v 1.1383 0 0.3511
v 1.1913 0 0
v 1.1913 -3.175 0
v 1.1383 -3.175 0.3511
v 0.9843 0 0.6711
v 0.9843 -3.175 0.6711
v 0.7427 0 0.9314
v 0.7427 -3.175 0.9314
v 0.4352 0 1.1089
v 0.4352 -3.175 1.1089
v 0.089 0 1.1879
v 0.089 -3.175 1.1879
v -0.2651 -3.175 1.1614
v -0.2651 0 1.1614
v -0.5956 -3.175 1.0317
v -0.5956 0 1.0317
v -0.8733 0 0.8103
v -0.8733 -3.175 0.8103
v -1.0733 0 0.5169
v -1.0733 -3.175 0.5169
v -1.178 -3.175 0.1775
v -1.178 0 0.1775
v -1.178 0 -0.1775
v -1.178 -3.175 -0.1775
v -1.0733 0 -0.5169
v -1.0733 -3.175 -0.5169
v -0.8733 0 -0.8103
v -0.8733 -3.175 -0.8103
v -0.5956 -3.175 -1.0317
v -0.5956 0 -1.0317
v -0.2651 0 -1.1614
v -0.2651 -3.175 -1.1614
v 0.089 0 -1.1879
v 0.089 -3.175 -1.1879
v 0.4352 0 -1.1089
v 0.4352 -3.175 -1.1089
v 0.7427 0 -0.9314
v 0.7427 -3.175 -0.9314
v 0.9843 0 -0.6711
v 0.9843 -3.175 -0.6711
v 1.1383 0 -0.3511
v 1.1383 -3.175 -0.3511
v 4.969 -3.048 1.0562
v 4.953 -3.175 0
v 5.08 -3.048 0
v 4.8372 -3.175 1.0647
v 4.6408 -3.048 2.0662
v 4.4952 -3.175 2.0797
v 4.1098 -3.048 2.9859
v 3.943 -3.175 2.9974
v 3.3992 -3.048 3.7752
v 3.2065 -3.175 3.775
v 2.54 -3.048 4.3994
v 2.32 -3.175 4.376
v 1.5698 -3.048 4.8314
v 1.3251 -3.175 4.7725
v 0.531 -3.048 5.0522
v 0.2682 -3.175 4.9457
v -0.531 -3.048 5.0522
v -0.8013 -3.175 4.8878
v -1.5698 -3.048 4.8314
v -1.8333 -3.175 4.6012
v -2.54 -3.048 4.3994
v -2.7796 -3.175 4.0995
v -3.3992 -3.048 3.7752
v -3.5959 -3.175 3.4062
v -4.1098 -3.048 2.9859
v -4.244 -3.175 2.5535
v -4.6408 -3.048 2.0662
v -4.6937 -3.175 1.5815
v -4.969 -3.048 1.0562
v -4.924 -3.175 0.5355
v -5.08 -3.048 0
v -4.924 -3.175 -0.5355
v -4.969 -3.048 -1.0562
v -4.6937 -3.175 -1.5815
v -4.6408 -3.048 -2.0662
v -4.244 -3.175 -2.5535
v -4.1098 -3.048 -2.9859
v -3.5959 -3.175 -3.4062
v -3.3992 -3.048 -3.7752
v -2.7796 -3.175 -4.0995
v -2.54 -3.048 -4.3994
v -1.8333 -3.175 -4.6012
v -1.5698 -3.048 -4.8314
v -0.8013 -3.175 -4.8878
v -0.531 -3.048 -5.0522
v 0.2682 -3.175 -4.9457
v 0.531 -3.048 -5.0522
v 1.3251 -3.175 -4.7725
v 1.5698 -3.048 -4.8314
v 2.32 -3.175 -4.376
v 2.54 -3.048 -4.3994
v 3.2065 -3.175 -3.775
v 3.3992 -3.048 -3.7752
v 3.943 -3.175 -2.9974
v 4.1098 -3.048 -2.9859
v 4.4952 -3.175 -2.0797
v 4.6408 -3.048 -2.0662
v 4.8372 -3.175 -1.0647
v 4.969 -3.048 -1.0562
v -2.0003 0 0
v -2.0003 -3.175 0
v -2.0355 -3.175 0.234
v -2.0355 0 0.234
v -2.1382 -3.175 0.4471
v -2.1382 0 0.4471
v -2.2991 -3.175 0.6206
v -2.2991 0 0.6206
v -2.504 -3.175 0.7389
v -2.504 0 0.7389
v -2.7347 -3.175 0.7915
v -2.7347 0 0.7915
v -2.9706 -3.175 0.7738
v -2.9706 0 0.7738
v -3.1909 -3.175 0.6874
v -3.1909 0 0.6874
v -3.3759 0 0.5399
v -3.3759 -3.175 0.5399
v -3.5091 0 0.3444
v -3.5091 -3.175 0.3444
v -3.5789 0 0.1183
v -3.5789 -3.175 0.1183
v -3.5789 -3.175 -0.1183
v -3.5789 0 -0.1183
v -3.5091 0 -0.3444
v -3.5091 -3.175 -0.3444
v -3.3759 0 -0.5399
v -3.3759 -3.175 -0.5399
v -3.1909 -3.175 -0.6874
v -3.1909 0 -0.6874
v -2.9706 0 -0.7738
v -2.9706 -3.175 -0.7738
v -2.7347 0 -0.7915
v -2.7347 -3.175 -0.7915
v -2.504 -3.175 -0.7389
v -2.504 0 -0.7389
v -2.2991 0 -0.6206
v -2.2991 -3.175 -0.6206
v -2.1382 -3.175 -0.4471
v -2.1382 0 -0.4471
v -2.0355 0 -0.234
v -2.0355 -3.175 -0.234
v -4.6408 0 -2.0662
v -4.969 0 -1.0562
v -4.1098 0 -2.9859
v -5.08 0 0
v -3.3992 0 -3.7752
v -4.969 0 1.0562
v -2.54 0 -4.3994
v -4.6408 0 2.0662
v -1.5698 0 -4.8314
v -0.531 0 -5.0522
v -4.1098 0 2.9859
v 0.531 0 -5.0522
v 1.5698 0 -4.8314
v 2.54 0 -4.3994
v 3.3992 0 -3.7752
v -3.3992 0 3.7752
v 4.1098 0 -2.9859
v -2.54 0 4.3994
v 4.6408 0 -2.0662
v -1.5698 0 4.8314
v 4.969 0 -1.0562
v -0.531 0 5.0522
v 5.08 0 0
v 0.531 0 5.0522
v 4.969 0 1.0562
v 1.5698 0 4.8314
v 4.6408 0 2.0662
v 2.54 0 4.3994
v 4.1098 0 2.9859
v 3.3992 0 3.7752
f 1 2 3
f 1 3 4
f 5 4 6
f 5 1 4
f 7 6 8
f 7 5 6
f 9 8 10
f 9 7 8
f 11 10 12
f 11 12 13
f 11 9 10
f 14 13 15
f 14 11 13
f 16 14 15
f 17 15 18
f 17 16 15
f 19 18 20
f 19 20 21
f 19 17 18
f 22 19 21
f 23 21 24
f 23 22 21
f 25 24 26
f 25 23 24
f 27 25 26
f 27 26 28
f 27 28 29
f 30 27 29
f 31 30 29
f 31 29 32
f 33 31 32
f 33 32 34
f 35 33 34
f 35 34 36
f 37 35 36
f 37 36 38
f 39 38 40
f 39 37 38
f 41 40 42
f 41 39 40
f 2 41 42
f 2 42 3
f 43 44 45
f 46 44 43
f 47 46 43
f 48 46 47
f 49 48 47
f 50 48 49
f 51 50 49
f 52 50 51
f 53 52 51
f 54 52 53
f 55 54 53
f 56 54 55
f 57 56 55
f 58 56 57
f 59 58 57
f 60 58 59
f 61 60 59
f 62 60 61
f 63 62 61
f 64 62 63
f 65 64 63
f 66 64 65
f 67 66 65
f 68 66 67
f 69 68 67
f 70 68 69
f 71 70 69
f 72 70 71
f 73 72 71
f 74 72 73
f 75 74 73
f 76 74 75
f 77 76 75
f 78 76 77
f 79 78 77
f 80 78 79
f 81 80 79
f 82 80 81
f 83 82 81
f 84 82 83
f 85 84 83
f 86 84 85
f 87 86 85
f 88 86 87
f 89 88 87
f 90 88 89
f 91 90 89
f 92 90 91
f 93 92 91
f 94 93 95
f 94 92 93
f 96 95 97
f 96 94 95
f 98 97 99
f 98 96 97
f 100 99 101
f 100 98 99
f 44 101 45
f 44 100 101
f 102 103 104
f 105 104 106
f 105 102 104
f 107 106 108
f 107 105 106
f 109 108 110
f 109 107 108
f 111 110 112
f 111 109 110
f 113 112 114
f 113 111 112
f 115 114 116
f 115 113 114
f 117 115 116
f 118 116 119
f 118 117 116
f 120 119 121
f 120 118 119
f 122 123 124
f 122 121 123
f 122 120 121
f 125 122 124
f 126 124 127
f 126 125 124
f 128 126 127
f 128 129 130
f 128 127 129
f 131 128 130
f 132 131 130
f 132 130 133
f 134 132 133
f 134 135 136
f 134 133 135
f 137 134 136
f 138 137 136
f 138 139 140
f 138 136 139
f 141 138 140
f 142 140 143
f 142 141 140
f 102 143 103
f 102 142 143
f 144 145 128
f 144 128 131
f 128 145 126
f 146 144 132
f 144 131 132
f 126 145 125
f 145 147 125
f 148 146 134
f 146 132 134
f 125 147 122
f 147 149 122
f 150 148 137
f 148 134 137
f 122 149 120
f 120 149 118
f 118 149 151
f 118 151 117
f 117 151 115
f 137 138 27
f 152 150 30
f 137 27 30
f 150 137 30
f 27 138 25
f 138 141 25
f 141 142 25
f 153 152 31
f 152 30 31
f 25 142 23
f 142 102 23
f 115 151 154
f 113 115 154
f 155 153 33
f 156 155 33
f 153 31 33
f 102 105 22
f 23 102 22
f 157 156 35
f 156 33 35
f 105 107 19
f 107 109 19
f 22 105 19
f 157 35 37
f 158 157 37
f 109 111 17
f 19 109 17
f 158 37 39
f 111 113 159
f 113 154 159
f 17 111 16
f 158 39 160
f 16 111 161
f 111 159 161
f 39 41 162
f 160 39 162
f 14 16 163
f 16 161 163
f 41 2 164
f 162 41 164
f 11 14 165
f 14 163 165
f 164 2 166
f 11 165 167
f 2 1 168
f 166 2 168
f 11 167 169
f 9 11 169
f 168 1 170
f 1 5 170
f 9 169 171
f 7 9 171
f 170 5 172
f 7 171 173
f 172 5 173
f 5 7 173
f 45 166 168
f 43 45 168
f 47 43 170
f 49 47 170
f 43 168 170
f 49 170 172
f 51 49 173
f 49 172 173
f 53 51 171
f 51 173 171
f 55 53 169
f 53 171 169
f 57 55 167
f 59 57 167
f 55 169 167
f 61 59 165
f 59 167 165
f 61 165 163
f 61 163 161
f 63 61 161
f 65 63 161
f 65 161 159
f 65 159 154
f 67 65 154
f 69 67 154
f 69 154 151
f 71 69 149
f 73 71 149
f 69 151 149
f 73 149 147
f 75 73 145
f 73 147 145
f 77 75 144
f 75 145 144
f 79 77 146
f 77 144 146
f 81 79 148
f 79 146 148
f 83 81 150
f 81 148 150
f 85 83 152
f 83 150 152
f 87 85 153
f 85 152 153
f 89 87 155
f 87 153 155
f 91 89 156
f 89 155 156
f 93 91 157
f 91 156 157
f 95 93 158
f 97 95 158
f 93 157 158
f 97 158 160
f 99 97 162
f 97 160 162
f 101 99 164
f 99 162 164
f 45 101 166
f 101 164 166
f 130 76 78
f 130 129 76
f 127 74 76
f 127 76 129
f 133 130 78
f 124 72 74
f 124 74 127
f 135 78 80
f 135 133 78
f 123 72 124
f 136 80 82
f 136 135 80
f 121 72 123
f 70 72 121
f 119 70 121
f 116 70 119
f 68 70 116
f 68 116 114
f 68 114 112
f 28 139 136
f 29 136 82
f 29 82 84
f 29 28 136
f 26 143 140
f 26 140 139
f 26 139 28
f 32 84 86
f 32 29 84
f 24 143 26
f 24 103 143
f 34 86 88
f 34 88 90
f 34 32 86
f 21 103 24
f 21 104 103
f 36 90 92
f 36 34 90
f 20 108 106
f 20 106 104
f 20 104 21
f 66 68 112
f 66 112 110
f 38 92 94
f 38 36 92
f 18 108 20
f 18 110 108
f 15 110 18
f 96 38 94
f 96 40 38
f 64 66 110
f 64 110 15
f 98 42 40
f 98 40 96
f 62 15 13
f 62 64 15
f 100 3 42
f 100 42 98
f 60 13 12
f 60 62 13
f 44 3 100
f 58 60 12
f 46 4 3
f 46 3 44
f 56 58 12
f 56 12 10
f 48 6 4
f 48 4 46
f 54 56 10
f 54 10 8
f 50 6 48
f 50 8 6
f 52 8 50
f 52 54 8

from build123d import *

# Parameters (mm, degrees)
F0_R          = 5.08
F0_R_2        = 1.19126
F1_DEPTH      = 3.175
F2_SIZE       = 0.127
F3_R          = 0.79375
F4_DEPTH      = 25.4
F4_DEPTH_BACK = 25.4


with BuildPart() as f1:
    # F0 (on Front) → F1 (new body)
    with BuildSketch(Plane.XZ):
        Circle(F0_R)
        Circle(F0_R_2, mode=Mode.SUBTRACT)
    extrude(amount=F1_DEPTH)

    # F2
    f2_edges = [f1.edges().sort_by_distance(p)[0] for p in [
        (-5.08, -3.175, 0),
    ]]
    chamfer(f2_edges, length=F2_SIZE)

    # F3 (on Front) → F4 (cut, two sides)
    with BuildSketch(Plane.XZ) as f4_sk:
        with Locations((-2.794, 0)):
            Circle(F3_R)
    extrude(amount=-F4_DEPTH, mode=Mode.SUBTRACT)
    extrude(f4_sk.sketch, amount=F4_DEPTH_BACK, mode=Mode.SUBTRACT)


solid = f1.part
